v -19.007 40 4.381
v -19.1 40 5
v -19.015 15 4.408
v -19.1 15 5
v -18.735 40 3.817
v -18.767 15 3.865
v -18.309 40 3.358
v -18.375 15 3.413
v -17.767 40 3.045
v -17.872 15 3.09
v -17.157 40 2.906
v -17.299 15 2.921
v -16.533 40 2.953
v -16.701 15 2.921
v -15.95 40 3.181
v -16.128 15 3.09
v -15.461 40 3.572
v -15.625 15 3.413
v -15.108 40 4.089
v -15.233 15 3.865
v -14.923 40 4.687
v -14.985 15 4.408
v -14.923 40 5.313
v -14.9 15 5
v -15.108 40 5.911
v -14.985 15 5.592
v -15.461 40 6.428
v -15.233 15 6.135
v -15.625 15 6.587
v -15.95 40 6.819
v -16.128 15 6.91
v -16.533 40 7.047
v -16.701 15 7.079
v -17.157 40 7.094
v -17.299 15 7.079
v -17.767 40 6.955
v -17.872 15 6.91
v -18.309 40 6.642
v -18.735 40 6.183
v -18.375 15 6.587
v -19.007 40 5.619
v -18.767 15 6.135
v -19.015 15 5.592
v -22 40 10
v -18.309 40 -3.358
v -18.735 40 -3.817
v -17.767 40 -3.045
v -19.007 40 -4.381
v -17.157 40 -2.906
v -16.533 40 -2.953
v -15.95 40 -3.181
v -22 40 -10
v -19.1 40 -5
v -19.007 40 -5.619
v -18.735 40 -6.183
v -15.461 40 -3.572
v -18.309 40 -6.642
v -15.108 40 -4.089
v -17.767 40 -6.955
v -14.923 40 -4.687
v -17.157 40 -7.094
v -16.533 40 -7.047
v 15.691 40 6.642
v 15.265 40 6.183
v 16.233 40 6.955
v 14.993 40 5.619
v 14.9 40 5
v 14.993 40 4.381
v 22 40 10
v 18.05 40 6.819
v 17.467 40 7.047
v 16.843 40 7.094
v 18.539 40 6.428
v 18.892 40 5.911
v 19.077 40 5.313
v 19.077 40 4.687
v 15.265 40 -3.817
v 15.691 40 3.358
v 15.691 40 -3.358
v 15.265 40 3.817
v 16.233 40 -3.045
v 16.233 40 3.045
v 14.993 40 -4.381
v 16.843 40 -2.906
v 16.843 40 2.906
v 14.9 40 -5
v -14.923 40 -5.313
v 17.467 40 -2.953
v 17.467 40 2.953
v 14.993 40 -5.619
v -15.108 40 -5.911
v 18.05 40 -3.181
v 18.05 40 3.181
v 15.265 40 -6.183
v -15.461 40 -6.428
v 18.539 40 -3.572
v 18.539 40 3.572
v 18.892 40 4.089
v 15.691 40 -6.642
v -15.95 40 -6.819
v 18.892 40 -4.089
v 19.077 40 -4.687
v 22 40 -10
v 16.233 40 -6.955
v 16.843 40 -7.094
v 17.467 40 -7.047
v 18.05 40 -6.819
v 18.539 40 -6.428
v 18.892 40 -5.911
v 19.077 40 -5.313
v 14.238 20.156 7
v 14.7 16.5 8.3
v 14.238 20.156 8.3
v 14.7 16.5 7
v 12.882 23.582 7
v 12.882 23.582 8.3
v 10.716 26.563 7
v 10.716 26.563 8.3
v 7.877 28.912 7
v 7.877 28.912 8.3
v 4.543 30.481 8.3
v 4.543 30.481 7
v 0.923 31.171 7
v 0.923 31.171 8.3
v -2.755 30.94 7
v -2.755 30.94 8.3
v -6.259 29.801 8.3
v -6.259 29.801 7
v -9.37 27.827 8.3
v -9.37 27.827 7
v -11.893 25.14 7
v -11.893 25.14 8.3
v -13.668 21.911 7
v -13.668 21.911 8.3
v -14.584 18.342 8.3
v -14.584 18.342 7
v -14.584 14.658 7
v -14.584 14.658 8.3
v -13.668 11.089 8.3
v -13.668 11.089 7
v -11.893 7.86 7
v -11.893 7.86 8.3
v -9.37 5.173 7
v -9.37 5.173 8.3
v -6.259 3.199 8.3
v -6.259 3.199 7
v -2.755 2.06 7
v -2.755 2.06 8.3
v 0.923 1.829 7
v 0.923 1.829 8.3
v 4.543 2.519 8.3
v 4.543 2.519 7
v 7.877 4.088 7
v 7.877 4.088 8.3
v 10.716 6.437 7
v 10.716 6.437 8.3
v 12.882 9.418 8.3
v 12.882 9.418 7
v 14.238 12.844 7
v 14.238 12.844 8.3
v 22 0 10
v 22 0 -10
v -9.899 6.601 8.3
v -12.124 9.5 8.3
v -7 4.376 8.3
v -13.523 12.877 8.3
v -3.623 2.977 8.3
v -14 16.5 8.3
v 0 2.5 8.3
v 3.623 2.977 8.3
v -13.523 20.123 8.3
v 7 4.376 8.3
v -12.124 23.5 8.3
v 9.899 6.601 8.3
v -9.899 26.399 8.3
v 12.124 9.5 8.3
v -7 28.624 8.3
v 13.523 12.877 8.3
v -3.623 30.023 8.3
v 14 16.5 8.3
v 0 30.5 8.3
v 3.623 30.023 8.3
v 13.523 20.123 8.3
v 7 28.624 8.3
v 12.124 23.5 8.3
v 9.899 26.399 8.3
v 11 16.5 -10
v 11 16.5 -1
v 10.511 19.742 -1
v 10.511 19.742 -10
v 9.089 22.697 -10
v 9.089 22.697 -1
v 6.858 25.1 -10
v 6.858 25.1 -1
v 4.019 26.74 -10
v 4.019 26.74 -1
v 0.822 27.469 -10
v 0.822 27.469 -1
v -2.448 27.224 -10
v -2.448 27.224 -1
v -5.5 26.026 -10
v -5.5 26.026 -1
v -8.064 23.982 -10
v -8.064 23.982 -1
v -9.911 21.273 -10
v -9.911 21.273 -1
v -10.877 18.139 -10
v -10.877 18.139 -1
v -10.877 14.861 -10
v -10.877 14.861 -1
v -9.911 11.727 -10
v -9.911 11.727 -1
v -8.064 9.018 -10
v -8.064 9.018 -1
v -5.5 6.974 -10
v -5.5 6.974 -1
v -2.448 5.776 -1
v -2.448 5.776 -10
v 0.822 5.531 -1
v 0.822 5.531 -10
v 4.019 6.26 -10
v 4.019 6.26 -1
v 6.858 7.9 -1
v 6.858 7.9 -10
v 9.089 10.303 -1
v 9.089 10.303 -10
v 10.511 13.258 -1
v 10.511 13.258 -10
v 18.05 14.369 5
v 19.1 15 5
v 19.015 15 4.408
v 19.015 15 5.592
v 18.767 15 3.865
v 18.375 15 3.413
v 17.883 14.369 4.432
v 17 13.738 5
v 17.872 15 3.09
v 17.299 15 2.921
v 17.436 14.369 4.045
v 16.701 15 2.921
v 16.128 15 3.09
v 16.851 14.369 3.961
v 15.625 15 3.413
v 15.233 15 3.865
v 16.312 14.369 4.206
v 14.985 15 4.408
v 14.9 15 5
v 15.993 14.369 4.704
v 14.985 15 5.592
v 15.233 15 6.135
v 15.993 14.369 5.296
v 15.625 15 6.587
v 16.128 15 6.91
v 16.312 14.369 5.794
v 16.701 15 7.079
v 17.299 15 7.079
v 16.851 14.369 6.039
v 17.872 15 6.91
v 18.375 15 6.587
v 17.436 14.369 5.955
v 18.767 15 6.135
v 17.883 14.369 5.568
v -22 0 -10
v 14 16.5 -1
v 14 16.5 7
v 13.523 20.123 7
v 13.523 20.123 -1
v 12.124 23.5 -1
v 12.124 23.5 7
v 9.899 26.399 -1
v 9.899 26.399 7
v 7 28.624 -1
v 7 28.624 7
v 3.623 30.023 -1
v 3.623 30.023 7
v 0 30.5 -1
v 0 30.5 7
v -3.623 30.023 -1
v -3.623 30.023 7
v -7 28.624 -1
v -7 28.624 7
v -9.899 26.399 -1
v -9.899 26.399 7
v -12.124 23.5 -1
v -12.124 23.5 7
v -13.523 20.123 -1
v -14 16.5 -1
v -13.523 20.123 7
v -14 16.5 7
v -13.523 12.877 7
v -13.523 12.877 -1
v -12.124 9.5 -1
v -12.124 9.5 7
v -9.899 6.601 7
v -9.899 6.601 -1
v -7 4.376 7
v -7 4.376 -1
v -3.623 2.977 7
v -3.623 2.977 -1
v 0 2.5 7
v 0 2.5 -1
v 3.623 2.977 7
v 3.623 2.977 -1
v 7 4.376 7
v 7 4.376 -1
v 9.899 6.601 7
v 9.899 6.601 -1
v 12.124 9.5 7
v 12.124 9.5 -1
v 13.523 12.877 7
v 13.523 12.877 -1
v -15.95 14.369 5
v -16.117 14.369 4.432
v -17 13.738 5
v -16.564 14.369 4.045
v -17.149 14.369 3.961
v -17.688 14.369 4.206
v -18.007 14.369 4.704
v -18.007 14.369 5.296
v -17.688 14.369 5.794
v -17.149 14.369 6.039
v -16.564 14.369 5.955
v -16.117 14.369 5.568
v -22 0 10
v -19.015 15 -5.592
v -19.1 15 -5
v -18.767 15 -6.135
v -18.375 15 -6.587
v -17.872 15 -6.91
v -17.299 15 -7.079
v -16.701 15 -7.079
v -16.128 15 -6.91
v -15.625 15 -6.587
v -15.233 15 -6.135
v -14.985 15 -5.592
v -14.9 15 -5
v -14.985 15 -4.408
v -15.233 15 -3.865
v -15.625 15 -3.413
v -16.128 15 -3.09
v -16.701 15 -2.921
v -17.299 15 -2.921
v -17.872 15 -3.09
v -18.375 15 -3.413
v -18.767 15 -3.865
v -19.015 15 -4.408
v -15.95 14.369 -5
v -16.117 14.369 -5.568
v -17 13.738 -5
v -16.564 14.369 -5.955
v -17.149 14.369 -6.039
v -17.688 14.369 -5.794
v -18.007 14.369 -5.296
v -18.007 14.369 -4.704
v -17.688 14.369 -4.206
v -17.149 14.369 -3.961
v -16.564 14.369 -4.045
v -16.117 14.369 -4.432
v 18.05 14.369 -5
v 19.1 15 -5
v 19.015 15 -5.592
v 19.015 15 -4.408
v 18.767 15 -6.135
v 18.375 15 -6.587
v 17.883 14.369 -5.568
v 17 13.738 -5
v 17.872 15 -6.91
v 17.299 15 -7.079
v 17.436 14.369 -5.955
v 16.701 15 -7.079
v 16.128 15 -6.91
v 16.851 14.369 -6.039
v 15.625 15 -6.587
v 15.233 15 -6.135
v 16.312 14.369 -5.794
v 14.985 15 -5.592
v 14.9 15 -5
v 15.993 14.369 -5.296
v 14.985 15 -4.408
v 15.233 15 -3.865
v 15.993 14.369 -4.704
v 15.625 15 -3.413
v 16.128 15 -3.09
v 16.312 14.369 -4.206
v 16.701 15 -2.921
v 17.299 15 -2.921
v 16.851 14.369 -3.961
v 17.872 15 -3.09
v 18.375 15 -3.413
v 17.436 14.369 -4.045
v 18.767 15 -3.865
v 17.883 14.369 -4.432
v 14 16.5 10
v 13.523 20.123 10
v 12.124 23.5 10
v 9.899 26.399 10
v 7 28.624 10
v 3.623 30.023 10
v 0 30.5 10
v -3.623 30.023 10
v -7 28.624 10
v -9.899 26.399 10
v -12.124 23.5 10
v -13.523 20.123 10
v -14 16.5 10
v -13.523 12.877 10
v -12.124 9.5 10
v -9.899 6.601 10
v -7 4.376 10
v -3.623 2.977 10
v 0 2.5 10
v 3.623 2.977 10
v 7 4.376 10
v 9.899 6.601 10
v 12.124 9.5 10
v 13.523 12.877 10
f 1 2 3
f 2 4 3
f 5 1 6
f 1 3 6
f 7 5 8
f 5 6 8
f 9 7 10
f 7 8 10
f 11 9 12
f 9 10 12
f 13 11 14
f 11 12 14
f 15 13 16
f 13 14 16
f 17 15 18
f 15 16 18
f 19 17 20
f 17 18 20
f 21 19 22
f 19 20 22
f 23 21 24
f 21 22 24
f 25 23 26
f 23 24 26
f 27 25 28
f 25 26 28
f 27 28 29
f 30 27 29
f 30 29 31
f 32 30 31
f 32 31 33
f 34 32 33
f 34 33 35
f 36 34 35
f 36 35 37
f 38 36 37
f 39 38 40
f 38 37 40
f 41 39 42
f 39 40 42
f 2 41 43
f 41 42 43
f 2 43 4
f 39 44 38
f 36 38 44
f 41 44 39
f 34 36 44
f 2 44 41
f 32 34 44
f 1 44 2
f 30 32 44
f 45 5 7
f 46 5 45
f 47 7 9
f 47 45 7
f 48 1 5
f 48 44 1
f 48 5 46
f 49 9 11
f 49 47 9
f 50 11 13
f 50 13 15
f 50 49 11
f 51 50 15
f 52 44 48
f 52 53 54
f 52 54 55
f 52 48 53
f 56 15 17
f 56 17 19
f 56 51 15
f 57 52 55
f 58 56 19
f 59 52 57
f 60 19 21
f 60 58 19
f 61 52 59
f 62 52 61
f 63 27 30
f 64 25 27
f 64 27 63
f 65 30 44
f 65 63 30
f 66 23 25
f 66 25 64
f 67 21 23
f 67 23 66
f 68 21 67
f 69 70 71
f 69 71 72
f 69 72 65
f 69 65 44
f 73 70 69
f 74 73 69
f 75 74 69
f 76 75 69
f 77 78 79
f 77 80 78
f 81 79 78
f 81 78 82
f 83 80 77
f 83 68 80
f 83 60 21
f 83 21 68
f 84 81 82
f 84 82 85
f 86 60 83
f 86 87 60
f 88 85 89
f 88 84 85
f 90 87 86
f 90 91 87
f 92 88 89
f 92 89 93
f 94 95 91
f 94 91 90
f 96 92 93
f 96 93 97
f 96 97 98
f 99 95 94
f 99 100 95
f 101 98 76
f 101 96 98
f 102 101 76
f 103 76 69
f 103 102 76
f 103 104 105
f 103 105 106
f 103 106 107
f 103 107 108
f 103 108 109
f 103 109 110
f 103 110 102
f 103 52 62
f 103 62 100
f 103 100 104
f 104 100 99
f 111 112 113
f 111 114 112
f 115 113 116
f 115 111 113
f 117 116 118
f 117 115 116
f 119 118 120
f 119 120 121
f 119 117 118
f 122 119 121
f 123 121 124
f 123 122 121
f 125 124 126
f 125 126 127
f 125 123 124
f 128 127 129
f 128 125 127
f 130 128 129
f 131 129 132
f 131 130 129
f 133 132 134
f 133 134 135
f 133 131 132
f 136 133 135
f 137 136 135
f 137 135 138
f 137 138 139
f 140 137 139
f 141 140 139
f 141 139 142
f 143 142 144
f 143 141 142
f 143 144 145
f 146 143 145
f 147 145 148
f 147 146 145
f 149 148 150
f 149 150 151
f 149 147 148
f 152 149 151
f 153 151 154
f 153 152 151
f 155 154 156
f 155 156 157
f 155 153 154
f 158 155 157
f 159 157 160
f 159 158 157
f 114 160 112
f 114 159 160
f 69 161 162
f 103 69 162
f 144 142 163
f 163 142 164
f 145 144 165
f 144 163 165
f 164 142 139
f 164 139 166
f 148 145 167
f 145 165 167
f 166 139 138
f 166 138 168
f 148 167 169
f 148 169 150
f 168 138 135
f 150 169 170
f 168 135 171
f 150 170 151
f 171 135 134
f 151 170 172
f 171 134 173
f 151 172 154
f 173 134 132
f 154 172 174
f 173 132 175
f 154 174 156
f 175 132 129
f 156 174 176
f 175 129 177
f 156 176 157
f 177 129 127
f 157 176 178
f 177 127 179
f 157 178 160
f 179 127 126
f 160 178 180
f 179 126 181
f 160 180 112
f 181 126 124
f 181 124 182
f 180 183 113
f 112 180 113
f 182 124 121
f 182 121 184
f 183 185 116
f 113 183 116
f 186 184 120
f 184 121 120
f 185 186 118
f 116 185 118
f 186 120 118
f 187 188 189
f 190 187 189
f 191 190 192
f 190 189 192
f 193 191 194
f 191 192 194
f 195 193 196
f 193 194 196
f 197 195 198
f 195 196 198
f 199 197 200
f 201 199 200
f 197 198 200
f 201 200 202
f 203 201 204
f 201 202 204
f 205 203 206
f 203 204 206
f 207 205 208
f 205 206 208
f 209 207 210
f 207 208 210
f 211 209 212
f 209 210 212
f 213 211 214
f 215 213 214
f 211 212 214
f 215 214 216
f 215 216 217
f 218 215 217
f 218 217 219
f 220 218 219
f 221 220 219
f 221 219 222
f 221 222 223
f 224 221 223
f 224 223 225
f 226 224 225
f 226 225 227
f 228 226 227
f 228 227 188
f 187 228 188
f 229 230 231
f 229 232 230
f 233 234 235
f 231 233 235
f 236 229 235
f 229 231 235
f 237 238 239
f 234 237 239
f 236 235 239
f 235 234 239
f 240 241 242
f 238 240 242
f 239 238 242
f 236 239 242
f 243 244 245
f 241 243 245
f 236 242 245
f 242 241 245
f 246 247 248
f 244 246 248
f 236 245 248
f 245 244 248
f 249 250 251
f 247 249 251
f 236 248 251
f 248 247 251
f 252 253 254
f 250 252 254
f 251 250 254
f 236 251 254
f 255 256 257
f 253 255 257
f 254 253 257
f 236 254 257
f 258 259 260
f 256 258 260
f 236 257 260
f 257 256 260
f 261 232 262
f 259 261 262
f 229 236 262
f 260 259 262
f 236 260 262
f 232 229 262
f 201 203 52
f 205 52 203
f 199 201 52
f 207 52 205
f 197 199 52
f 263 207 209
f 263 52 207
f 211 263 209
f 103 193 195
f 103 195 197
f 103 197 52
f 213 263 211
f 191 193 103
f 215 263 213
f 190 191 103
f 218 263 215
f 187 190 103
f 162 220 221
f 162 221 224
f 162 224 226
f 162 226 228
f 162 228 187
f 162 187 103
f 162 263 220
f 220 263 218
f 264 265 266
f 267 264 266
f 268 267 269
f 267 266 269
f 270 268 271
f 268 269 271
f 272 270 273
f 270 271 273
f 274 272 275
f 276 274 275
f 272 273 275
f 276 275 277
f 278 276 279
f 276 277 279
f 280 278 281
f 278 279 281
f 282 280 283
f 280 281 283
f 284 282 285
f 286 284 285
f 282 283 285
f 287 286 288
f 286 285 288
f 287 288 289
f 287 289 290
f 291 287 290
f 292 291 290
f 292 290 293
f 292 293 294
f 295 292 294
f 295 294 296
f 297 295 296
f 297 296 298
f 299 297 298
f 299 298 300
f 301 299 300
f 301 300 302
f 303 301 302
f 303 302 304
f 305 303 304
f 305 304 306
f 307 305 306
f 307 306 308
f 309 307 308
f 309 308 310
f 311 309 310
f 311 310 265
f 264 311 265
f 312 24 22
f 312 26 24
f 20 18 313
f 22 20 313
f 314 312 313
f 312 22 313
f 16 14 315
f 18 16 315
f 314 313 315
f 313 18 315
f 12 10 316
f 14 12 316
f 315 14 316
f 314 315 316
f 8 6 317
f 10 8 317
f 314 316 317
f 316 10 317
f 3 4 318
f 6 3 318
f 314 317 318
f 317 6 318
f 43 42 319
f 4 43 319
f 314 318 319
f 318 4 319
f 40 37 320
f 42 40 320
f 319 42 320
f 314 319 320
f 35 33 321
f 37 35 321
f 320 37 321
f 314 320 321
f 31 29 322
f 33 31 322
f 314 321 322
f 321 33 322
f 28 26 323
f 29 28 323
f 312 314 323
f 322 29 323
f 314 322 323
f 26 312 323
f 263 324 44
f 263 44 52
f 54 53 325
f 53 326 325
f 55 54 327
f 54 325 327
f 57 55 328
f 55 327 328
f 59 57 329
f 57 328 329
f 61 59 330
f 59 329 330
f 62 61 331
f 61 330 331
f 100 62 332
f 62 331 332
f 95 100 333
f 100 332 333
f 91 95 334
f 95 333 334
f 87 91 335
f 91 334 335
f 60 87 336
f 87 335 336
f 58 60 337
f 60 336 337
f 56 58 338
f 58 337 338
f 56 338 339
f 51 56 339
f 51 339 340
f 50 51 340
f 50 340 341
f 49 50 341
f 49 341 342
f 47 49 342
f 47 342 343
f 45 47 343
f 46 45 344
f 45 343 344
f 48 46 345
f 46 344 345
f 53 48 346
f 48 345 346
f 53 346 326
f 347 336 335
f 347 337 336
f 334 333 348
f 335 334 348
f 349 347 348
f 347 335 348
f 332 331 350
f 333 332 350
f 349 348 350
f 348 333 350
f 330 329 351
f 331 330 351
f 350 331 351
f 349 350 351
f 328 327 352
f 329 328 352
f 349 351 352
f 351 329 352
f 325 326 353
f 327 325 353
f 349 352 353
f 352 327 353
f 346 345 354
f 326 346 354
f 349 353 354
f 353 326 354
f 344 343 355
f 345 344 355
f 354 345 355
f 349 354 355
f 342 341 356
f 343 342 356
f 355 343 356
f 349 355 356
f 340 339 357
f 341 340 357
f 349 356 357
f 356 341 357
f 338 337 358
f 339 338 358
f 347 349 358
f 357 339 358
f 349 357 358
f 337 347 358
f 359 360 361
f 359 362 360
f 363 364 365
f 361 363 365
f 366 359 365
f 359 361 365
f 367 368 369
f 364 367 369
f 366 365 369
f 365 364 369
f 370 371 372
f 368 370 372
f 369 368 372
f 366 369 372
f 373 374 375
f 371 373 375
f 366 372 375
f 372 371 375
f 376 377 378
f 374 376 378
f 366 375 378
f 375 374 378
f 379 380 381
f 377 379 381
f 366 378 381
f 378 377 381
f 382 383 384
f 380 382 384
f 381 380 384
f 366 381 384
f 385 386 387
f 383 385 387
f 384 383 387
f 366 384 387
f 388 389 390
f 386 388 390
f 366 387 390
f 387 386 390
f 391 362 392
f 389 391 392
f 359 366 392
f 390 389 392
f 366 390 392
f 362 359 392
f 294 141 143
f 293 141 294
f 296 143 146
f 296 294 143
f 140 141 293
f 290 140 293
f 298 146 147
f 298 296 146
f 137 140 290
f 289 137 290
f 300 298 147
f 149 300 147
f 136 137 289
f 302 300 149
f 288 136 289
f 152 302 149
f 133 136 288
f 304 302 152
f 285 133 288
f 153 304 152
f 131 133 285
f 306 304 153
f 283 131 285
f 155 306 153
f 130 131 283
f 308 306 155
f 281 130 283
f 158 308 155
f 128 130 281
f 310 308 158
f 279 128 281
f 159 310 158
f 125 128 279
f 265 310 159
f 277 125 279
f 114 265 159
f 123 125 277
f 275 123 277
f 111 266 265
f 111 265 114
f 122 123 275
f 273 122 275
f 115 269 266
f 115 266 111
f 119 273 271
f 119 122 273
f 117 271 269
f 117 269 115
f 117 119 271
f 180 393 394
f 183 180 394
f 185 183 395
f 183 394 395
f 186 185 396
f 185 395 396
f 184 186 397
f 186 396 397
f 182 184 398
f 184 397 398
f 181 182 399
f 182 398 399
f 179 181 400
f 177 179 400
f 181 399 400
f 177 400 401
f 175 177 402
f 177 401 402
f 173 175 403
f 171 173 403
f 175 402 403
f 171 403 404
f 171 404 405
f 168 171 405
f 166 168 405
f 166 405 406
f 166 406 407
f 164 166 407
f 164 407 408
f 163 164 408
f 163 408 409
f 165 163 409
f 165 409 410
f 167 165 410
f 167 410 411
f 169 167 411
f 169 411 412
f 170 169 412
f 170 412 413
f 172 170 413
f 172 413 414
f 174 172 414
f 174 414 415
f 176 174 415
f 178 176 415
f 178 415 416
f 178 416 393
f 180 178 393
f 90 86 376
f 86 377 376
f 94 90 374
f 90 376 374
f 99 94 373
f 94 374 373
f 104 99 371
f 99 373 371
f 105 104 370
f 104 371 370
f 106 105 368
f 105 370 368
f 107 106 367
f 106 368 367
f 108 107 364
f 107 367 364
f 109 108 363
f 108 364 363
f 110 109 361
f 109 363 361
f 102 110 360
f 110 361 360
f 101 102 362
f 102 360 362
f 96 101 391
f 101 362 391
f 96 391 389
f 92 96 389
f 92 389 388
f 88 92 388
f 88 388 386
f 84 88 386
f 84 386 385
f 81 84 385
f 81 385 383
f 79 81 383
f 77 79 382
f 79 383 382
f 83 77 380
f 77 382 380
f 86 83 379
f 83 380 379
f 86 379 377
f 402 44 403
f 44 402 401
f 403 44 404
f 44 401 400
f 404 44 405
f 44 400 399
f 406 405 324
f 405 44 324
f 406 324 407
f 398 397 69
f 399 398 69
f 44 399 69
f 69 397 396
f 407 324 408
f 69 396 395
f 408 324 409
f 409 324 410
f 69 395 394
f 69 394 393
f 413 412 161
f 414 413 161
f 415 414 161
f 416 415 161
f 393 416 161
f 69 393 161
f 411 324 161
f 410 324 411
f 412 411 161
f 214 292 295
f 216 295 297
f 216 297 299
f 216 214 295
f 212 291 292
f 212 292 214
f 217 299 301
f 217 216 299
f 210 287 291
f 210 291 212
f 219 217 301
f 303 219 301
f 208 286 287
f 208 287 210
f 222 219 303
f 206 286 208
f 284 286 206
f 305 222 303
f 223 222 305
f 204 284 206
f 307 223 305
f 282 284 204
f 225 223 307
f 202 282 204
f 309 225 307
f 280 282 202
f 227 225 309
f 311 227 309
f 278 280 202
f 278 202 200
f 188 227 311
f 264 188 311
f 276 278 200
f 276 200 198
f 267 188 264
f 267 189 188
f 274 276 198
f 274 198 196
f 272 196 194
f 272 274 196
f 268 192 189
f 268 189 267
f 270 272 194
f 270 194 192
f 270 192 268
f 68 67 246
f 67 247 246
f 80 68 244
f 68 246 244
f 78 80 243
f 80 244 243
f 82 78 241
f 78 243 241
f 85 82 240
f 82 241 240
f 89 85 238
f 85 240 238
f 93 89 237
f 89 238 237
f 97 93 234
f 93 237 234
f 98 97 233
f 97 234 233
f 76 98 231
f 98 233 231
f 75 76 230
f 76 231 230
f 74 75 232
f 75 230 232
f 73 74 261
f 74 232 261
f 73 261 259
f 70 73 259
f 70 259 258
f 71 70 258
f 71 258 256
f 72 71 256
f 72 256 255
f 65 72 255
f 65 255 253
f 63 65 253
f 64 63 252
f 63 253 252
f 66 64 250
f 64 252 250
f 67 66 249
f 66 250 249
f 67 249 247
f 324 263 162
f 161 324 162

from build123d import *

# Parameters (mm, degrees)
SZKIC1_W                       = 44
SZKIC1_H                       = 20
DODANIE_WYCI_GNI_CIE1_DEPTH    = 40
SZKIC3_R                       = 11
WYTNIJ_WYCI_GNI_CIE2_DEPTH     = 50.839743178
SZKIC4_R                       = 14
WYTNIJ_WYCI_GNI_CIE3_DEPTH     = 11
OTW_R_GWINTOWANY_M5X0_81_D     = 4.2
OTW_R_GWINTOWANY_M5X0_81_DEPTH = 25
OTW_R_GWINTOWANY_M5X0_81_TIP   = 1.2618073
SZKIC5_W                       = 1.3
SZKIC5_H                       = 0.7


with BuildPart() as part:
    # Szkic1 → Dodanie-wyciągnięcie1 (new body)
    with BuildSketch(Plane(origin=(0, 0, 0), x_dir=(1, 0, 0), z_dir=(0, 1, 0))):
        Rectangle(SZKIC1_W, SZKIC1_H)
    extrude(amount=DODANIE_WYCI_GNI_CIE1_DEPTH)

    # Szkic3 → Wytnij-wyciągnięcie2 (cut, through all)
    with BuildSketch(Plane.XY.offset(10)):
        with Locations((0, 16.5)):
            Circle(SZKIC3_R)
    extrude(amount=-WYTNIJ_WYCI_GNI_CIE2_DEPTH, mode=Mode.SUBTRACT)

    # Szkic4 → Wytnij-wyciągnięcie3 (cut)
    with BuildSketch(Plane.XY.offset(10)):
        with Locations((0, 16.5)):
            Circle(SZKIC4_R)
    extrude(amount=-WYTNIJ_WYCI_GNI_CIE3_DEPTH, mode=Mode.SUBTRACT)

    # Otwór gwintowany M5x0.81
    with Locations(Plane(origin=(0, 40, 0), x_dir=(1, 0, 0), z_dir=(0, 1, 0))):
        with Locations((17, 5), (17, -5), (-17, -5), (-17, 5)):
            Hole(OTW_R_GWINTOWANY_M5X0_81_D / 2, depth=OTW_R_GWINTOWANY_M5X0_81_DEPTH)
            with Locations((0, 0, -(OTW_R_GWINTOWANY_M5X0_81_DEPTH + OTW_R_GWINTOWANY_M5X0_81_TIP / 2))):  # 118° drill point
                Cone(0, OTW_R_GWINTOWANY_M5X0_81_D / 2, OTW_R_GWINTOWANY_M5X0_81_TIP, mode=Mode.SUBTRACT)

    # Szkic5 → Wycięcie-obrót1 (revolve, cut)
    with BuildSketch(Plane(origin=(0, 0, 0), x_dir=(0, 0, -1), z_dir=(1, 0, 0)), mode=Mode.PRIVATE) as wyci_cie_obr_t1_sk:
        with Locations((-7.65, 2.15)):
            Rectangle(SZKIC5_W, SZKIC5_H)
    revolve(wyci_cie_obr_t1_sk.sketch.rotate(Axis((0, 16.5, 9.294649117), (0, 0, 1)), 90), axis=Axis((0, 16.5, 9.294649117), (0, 0, 1)), mode=Mode.SUBTRACT)


solid = part.part
